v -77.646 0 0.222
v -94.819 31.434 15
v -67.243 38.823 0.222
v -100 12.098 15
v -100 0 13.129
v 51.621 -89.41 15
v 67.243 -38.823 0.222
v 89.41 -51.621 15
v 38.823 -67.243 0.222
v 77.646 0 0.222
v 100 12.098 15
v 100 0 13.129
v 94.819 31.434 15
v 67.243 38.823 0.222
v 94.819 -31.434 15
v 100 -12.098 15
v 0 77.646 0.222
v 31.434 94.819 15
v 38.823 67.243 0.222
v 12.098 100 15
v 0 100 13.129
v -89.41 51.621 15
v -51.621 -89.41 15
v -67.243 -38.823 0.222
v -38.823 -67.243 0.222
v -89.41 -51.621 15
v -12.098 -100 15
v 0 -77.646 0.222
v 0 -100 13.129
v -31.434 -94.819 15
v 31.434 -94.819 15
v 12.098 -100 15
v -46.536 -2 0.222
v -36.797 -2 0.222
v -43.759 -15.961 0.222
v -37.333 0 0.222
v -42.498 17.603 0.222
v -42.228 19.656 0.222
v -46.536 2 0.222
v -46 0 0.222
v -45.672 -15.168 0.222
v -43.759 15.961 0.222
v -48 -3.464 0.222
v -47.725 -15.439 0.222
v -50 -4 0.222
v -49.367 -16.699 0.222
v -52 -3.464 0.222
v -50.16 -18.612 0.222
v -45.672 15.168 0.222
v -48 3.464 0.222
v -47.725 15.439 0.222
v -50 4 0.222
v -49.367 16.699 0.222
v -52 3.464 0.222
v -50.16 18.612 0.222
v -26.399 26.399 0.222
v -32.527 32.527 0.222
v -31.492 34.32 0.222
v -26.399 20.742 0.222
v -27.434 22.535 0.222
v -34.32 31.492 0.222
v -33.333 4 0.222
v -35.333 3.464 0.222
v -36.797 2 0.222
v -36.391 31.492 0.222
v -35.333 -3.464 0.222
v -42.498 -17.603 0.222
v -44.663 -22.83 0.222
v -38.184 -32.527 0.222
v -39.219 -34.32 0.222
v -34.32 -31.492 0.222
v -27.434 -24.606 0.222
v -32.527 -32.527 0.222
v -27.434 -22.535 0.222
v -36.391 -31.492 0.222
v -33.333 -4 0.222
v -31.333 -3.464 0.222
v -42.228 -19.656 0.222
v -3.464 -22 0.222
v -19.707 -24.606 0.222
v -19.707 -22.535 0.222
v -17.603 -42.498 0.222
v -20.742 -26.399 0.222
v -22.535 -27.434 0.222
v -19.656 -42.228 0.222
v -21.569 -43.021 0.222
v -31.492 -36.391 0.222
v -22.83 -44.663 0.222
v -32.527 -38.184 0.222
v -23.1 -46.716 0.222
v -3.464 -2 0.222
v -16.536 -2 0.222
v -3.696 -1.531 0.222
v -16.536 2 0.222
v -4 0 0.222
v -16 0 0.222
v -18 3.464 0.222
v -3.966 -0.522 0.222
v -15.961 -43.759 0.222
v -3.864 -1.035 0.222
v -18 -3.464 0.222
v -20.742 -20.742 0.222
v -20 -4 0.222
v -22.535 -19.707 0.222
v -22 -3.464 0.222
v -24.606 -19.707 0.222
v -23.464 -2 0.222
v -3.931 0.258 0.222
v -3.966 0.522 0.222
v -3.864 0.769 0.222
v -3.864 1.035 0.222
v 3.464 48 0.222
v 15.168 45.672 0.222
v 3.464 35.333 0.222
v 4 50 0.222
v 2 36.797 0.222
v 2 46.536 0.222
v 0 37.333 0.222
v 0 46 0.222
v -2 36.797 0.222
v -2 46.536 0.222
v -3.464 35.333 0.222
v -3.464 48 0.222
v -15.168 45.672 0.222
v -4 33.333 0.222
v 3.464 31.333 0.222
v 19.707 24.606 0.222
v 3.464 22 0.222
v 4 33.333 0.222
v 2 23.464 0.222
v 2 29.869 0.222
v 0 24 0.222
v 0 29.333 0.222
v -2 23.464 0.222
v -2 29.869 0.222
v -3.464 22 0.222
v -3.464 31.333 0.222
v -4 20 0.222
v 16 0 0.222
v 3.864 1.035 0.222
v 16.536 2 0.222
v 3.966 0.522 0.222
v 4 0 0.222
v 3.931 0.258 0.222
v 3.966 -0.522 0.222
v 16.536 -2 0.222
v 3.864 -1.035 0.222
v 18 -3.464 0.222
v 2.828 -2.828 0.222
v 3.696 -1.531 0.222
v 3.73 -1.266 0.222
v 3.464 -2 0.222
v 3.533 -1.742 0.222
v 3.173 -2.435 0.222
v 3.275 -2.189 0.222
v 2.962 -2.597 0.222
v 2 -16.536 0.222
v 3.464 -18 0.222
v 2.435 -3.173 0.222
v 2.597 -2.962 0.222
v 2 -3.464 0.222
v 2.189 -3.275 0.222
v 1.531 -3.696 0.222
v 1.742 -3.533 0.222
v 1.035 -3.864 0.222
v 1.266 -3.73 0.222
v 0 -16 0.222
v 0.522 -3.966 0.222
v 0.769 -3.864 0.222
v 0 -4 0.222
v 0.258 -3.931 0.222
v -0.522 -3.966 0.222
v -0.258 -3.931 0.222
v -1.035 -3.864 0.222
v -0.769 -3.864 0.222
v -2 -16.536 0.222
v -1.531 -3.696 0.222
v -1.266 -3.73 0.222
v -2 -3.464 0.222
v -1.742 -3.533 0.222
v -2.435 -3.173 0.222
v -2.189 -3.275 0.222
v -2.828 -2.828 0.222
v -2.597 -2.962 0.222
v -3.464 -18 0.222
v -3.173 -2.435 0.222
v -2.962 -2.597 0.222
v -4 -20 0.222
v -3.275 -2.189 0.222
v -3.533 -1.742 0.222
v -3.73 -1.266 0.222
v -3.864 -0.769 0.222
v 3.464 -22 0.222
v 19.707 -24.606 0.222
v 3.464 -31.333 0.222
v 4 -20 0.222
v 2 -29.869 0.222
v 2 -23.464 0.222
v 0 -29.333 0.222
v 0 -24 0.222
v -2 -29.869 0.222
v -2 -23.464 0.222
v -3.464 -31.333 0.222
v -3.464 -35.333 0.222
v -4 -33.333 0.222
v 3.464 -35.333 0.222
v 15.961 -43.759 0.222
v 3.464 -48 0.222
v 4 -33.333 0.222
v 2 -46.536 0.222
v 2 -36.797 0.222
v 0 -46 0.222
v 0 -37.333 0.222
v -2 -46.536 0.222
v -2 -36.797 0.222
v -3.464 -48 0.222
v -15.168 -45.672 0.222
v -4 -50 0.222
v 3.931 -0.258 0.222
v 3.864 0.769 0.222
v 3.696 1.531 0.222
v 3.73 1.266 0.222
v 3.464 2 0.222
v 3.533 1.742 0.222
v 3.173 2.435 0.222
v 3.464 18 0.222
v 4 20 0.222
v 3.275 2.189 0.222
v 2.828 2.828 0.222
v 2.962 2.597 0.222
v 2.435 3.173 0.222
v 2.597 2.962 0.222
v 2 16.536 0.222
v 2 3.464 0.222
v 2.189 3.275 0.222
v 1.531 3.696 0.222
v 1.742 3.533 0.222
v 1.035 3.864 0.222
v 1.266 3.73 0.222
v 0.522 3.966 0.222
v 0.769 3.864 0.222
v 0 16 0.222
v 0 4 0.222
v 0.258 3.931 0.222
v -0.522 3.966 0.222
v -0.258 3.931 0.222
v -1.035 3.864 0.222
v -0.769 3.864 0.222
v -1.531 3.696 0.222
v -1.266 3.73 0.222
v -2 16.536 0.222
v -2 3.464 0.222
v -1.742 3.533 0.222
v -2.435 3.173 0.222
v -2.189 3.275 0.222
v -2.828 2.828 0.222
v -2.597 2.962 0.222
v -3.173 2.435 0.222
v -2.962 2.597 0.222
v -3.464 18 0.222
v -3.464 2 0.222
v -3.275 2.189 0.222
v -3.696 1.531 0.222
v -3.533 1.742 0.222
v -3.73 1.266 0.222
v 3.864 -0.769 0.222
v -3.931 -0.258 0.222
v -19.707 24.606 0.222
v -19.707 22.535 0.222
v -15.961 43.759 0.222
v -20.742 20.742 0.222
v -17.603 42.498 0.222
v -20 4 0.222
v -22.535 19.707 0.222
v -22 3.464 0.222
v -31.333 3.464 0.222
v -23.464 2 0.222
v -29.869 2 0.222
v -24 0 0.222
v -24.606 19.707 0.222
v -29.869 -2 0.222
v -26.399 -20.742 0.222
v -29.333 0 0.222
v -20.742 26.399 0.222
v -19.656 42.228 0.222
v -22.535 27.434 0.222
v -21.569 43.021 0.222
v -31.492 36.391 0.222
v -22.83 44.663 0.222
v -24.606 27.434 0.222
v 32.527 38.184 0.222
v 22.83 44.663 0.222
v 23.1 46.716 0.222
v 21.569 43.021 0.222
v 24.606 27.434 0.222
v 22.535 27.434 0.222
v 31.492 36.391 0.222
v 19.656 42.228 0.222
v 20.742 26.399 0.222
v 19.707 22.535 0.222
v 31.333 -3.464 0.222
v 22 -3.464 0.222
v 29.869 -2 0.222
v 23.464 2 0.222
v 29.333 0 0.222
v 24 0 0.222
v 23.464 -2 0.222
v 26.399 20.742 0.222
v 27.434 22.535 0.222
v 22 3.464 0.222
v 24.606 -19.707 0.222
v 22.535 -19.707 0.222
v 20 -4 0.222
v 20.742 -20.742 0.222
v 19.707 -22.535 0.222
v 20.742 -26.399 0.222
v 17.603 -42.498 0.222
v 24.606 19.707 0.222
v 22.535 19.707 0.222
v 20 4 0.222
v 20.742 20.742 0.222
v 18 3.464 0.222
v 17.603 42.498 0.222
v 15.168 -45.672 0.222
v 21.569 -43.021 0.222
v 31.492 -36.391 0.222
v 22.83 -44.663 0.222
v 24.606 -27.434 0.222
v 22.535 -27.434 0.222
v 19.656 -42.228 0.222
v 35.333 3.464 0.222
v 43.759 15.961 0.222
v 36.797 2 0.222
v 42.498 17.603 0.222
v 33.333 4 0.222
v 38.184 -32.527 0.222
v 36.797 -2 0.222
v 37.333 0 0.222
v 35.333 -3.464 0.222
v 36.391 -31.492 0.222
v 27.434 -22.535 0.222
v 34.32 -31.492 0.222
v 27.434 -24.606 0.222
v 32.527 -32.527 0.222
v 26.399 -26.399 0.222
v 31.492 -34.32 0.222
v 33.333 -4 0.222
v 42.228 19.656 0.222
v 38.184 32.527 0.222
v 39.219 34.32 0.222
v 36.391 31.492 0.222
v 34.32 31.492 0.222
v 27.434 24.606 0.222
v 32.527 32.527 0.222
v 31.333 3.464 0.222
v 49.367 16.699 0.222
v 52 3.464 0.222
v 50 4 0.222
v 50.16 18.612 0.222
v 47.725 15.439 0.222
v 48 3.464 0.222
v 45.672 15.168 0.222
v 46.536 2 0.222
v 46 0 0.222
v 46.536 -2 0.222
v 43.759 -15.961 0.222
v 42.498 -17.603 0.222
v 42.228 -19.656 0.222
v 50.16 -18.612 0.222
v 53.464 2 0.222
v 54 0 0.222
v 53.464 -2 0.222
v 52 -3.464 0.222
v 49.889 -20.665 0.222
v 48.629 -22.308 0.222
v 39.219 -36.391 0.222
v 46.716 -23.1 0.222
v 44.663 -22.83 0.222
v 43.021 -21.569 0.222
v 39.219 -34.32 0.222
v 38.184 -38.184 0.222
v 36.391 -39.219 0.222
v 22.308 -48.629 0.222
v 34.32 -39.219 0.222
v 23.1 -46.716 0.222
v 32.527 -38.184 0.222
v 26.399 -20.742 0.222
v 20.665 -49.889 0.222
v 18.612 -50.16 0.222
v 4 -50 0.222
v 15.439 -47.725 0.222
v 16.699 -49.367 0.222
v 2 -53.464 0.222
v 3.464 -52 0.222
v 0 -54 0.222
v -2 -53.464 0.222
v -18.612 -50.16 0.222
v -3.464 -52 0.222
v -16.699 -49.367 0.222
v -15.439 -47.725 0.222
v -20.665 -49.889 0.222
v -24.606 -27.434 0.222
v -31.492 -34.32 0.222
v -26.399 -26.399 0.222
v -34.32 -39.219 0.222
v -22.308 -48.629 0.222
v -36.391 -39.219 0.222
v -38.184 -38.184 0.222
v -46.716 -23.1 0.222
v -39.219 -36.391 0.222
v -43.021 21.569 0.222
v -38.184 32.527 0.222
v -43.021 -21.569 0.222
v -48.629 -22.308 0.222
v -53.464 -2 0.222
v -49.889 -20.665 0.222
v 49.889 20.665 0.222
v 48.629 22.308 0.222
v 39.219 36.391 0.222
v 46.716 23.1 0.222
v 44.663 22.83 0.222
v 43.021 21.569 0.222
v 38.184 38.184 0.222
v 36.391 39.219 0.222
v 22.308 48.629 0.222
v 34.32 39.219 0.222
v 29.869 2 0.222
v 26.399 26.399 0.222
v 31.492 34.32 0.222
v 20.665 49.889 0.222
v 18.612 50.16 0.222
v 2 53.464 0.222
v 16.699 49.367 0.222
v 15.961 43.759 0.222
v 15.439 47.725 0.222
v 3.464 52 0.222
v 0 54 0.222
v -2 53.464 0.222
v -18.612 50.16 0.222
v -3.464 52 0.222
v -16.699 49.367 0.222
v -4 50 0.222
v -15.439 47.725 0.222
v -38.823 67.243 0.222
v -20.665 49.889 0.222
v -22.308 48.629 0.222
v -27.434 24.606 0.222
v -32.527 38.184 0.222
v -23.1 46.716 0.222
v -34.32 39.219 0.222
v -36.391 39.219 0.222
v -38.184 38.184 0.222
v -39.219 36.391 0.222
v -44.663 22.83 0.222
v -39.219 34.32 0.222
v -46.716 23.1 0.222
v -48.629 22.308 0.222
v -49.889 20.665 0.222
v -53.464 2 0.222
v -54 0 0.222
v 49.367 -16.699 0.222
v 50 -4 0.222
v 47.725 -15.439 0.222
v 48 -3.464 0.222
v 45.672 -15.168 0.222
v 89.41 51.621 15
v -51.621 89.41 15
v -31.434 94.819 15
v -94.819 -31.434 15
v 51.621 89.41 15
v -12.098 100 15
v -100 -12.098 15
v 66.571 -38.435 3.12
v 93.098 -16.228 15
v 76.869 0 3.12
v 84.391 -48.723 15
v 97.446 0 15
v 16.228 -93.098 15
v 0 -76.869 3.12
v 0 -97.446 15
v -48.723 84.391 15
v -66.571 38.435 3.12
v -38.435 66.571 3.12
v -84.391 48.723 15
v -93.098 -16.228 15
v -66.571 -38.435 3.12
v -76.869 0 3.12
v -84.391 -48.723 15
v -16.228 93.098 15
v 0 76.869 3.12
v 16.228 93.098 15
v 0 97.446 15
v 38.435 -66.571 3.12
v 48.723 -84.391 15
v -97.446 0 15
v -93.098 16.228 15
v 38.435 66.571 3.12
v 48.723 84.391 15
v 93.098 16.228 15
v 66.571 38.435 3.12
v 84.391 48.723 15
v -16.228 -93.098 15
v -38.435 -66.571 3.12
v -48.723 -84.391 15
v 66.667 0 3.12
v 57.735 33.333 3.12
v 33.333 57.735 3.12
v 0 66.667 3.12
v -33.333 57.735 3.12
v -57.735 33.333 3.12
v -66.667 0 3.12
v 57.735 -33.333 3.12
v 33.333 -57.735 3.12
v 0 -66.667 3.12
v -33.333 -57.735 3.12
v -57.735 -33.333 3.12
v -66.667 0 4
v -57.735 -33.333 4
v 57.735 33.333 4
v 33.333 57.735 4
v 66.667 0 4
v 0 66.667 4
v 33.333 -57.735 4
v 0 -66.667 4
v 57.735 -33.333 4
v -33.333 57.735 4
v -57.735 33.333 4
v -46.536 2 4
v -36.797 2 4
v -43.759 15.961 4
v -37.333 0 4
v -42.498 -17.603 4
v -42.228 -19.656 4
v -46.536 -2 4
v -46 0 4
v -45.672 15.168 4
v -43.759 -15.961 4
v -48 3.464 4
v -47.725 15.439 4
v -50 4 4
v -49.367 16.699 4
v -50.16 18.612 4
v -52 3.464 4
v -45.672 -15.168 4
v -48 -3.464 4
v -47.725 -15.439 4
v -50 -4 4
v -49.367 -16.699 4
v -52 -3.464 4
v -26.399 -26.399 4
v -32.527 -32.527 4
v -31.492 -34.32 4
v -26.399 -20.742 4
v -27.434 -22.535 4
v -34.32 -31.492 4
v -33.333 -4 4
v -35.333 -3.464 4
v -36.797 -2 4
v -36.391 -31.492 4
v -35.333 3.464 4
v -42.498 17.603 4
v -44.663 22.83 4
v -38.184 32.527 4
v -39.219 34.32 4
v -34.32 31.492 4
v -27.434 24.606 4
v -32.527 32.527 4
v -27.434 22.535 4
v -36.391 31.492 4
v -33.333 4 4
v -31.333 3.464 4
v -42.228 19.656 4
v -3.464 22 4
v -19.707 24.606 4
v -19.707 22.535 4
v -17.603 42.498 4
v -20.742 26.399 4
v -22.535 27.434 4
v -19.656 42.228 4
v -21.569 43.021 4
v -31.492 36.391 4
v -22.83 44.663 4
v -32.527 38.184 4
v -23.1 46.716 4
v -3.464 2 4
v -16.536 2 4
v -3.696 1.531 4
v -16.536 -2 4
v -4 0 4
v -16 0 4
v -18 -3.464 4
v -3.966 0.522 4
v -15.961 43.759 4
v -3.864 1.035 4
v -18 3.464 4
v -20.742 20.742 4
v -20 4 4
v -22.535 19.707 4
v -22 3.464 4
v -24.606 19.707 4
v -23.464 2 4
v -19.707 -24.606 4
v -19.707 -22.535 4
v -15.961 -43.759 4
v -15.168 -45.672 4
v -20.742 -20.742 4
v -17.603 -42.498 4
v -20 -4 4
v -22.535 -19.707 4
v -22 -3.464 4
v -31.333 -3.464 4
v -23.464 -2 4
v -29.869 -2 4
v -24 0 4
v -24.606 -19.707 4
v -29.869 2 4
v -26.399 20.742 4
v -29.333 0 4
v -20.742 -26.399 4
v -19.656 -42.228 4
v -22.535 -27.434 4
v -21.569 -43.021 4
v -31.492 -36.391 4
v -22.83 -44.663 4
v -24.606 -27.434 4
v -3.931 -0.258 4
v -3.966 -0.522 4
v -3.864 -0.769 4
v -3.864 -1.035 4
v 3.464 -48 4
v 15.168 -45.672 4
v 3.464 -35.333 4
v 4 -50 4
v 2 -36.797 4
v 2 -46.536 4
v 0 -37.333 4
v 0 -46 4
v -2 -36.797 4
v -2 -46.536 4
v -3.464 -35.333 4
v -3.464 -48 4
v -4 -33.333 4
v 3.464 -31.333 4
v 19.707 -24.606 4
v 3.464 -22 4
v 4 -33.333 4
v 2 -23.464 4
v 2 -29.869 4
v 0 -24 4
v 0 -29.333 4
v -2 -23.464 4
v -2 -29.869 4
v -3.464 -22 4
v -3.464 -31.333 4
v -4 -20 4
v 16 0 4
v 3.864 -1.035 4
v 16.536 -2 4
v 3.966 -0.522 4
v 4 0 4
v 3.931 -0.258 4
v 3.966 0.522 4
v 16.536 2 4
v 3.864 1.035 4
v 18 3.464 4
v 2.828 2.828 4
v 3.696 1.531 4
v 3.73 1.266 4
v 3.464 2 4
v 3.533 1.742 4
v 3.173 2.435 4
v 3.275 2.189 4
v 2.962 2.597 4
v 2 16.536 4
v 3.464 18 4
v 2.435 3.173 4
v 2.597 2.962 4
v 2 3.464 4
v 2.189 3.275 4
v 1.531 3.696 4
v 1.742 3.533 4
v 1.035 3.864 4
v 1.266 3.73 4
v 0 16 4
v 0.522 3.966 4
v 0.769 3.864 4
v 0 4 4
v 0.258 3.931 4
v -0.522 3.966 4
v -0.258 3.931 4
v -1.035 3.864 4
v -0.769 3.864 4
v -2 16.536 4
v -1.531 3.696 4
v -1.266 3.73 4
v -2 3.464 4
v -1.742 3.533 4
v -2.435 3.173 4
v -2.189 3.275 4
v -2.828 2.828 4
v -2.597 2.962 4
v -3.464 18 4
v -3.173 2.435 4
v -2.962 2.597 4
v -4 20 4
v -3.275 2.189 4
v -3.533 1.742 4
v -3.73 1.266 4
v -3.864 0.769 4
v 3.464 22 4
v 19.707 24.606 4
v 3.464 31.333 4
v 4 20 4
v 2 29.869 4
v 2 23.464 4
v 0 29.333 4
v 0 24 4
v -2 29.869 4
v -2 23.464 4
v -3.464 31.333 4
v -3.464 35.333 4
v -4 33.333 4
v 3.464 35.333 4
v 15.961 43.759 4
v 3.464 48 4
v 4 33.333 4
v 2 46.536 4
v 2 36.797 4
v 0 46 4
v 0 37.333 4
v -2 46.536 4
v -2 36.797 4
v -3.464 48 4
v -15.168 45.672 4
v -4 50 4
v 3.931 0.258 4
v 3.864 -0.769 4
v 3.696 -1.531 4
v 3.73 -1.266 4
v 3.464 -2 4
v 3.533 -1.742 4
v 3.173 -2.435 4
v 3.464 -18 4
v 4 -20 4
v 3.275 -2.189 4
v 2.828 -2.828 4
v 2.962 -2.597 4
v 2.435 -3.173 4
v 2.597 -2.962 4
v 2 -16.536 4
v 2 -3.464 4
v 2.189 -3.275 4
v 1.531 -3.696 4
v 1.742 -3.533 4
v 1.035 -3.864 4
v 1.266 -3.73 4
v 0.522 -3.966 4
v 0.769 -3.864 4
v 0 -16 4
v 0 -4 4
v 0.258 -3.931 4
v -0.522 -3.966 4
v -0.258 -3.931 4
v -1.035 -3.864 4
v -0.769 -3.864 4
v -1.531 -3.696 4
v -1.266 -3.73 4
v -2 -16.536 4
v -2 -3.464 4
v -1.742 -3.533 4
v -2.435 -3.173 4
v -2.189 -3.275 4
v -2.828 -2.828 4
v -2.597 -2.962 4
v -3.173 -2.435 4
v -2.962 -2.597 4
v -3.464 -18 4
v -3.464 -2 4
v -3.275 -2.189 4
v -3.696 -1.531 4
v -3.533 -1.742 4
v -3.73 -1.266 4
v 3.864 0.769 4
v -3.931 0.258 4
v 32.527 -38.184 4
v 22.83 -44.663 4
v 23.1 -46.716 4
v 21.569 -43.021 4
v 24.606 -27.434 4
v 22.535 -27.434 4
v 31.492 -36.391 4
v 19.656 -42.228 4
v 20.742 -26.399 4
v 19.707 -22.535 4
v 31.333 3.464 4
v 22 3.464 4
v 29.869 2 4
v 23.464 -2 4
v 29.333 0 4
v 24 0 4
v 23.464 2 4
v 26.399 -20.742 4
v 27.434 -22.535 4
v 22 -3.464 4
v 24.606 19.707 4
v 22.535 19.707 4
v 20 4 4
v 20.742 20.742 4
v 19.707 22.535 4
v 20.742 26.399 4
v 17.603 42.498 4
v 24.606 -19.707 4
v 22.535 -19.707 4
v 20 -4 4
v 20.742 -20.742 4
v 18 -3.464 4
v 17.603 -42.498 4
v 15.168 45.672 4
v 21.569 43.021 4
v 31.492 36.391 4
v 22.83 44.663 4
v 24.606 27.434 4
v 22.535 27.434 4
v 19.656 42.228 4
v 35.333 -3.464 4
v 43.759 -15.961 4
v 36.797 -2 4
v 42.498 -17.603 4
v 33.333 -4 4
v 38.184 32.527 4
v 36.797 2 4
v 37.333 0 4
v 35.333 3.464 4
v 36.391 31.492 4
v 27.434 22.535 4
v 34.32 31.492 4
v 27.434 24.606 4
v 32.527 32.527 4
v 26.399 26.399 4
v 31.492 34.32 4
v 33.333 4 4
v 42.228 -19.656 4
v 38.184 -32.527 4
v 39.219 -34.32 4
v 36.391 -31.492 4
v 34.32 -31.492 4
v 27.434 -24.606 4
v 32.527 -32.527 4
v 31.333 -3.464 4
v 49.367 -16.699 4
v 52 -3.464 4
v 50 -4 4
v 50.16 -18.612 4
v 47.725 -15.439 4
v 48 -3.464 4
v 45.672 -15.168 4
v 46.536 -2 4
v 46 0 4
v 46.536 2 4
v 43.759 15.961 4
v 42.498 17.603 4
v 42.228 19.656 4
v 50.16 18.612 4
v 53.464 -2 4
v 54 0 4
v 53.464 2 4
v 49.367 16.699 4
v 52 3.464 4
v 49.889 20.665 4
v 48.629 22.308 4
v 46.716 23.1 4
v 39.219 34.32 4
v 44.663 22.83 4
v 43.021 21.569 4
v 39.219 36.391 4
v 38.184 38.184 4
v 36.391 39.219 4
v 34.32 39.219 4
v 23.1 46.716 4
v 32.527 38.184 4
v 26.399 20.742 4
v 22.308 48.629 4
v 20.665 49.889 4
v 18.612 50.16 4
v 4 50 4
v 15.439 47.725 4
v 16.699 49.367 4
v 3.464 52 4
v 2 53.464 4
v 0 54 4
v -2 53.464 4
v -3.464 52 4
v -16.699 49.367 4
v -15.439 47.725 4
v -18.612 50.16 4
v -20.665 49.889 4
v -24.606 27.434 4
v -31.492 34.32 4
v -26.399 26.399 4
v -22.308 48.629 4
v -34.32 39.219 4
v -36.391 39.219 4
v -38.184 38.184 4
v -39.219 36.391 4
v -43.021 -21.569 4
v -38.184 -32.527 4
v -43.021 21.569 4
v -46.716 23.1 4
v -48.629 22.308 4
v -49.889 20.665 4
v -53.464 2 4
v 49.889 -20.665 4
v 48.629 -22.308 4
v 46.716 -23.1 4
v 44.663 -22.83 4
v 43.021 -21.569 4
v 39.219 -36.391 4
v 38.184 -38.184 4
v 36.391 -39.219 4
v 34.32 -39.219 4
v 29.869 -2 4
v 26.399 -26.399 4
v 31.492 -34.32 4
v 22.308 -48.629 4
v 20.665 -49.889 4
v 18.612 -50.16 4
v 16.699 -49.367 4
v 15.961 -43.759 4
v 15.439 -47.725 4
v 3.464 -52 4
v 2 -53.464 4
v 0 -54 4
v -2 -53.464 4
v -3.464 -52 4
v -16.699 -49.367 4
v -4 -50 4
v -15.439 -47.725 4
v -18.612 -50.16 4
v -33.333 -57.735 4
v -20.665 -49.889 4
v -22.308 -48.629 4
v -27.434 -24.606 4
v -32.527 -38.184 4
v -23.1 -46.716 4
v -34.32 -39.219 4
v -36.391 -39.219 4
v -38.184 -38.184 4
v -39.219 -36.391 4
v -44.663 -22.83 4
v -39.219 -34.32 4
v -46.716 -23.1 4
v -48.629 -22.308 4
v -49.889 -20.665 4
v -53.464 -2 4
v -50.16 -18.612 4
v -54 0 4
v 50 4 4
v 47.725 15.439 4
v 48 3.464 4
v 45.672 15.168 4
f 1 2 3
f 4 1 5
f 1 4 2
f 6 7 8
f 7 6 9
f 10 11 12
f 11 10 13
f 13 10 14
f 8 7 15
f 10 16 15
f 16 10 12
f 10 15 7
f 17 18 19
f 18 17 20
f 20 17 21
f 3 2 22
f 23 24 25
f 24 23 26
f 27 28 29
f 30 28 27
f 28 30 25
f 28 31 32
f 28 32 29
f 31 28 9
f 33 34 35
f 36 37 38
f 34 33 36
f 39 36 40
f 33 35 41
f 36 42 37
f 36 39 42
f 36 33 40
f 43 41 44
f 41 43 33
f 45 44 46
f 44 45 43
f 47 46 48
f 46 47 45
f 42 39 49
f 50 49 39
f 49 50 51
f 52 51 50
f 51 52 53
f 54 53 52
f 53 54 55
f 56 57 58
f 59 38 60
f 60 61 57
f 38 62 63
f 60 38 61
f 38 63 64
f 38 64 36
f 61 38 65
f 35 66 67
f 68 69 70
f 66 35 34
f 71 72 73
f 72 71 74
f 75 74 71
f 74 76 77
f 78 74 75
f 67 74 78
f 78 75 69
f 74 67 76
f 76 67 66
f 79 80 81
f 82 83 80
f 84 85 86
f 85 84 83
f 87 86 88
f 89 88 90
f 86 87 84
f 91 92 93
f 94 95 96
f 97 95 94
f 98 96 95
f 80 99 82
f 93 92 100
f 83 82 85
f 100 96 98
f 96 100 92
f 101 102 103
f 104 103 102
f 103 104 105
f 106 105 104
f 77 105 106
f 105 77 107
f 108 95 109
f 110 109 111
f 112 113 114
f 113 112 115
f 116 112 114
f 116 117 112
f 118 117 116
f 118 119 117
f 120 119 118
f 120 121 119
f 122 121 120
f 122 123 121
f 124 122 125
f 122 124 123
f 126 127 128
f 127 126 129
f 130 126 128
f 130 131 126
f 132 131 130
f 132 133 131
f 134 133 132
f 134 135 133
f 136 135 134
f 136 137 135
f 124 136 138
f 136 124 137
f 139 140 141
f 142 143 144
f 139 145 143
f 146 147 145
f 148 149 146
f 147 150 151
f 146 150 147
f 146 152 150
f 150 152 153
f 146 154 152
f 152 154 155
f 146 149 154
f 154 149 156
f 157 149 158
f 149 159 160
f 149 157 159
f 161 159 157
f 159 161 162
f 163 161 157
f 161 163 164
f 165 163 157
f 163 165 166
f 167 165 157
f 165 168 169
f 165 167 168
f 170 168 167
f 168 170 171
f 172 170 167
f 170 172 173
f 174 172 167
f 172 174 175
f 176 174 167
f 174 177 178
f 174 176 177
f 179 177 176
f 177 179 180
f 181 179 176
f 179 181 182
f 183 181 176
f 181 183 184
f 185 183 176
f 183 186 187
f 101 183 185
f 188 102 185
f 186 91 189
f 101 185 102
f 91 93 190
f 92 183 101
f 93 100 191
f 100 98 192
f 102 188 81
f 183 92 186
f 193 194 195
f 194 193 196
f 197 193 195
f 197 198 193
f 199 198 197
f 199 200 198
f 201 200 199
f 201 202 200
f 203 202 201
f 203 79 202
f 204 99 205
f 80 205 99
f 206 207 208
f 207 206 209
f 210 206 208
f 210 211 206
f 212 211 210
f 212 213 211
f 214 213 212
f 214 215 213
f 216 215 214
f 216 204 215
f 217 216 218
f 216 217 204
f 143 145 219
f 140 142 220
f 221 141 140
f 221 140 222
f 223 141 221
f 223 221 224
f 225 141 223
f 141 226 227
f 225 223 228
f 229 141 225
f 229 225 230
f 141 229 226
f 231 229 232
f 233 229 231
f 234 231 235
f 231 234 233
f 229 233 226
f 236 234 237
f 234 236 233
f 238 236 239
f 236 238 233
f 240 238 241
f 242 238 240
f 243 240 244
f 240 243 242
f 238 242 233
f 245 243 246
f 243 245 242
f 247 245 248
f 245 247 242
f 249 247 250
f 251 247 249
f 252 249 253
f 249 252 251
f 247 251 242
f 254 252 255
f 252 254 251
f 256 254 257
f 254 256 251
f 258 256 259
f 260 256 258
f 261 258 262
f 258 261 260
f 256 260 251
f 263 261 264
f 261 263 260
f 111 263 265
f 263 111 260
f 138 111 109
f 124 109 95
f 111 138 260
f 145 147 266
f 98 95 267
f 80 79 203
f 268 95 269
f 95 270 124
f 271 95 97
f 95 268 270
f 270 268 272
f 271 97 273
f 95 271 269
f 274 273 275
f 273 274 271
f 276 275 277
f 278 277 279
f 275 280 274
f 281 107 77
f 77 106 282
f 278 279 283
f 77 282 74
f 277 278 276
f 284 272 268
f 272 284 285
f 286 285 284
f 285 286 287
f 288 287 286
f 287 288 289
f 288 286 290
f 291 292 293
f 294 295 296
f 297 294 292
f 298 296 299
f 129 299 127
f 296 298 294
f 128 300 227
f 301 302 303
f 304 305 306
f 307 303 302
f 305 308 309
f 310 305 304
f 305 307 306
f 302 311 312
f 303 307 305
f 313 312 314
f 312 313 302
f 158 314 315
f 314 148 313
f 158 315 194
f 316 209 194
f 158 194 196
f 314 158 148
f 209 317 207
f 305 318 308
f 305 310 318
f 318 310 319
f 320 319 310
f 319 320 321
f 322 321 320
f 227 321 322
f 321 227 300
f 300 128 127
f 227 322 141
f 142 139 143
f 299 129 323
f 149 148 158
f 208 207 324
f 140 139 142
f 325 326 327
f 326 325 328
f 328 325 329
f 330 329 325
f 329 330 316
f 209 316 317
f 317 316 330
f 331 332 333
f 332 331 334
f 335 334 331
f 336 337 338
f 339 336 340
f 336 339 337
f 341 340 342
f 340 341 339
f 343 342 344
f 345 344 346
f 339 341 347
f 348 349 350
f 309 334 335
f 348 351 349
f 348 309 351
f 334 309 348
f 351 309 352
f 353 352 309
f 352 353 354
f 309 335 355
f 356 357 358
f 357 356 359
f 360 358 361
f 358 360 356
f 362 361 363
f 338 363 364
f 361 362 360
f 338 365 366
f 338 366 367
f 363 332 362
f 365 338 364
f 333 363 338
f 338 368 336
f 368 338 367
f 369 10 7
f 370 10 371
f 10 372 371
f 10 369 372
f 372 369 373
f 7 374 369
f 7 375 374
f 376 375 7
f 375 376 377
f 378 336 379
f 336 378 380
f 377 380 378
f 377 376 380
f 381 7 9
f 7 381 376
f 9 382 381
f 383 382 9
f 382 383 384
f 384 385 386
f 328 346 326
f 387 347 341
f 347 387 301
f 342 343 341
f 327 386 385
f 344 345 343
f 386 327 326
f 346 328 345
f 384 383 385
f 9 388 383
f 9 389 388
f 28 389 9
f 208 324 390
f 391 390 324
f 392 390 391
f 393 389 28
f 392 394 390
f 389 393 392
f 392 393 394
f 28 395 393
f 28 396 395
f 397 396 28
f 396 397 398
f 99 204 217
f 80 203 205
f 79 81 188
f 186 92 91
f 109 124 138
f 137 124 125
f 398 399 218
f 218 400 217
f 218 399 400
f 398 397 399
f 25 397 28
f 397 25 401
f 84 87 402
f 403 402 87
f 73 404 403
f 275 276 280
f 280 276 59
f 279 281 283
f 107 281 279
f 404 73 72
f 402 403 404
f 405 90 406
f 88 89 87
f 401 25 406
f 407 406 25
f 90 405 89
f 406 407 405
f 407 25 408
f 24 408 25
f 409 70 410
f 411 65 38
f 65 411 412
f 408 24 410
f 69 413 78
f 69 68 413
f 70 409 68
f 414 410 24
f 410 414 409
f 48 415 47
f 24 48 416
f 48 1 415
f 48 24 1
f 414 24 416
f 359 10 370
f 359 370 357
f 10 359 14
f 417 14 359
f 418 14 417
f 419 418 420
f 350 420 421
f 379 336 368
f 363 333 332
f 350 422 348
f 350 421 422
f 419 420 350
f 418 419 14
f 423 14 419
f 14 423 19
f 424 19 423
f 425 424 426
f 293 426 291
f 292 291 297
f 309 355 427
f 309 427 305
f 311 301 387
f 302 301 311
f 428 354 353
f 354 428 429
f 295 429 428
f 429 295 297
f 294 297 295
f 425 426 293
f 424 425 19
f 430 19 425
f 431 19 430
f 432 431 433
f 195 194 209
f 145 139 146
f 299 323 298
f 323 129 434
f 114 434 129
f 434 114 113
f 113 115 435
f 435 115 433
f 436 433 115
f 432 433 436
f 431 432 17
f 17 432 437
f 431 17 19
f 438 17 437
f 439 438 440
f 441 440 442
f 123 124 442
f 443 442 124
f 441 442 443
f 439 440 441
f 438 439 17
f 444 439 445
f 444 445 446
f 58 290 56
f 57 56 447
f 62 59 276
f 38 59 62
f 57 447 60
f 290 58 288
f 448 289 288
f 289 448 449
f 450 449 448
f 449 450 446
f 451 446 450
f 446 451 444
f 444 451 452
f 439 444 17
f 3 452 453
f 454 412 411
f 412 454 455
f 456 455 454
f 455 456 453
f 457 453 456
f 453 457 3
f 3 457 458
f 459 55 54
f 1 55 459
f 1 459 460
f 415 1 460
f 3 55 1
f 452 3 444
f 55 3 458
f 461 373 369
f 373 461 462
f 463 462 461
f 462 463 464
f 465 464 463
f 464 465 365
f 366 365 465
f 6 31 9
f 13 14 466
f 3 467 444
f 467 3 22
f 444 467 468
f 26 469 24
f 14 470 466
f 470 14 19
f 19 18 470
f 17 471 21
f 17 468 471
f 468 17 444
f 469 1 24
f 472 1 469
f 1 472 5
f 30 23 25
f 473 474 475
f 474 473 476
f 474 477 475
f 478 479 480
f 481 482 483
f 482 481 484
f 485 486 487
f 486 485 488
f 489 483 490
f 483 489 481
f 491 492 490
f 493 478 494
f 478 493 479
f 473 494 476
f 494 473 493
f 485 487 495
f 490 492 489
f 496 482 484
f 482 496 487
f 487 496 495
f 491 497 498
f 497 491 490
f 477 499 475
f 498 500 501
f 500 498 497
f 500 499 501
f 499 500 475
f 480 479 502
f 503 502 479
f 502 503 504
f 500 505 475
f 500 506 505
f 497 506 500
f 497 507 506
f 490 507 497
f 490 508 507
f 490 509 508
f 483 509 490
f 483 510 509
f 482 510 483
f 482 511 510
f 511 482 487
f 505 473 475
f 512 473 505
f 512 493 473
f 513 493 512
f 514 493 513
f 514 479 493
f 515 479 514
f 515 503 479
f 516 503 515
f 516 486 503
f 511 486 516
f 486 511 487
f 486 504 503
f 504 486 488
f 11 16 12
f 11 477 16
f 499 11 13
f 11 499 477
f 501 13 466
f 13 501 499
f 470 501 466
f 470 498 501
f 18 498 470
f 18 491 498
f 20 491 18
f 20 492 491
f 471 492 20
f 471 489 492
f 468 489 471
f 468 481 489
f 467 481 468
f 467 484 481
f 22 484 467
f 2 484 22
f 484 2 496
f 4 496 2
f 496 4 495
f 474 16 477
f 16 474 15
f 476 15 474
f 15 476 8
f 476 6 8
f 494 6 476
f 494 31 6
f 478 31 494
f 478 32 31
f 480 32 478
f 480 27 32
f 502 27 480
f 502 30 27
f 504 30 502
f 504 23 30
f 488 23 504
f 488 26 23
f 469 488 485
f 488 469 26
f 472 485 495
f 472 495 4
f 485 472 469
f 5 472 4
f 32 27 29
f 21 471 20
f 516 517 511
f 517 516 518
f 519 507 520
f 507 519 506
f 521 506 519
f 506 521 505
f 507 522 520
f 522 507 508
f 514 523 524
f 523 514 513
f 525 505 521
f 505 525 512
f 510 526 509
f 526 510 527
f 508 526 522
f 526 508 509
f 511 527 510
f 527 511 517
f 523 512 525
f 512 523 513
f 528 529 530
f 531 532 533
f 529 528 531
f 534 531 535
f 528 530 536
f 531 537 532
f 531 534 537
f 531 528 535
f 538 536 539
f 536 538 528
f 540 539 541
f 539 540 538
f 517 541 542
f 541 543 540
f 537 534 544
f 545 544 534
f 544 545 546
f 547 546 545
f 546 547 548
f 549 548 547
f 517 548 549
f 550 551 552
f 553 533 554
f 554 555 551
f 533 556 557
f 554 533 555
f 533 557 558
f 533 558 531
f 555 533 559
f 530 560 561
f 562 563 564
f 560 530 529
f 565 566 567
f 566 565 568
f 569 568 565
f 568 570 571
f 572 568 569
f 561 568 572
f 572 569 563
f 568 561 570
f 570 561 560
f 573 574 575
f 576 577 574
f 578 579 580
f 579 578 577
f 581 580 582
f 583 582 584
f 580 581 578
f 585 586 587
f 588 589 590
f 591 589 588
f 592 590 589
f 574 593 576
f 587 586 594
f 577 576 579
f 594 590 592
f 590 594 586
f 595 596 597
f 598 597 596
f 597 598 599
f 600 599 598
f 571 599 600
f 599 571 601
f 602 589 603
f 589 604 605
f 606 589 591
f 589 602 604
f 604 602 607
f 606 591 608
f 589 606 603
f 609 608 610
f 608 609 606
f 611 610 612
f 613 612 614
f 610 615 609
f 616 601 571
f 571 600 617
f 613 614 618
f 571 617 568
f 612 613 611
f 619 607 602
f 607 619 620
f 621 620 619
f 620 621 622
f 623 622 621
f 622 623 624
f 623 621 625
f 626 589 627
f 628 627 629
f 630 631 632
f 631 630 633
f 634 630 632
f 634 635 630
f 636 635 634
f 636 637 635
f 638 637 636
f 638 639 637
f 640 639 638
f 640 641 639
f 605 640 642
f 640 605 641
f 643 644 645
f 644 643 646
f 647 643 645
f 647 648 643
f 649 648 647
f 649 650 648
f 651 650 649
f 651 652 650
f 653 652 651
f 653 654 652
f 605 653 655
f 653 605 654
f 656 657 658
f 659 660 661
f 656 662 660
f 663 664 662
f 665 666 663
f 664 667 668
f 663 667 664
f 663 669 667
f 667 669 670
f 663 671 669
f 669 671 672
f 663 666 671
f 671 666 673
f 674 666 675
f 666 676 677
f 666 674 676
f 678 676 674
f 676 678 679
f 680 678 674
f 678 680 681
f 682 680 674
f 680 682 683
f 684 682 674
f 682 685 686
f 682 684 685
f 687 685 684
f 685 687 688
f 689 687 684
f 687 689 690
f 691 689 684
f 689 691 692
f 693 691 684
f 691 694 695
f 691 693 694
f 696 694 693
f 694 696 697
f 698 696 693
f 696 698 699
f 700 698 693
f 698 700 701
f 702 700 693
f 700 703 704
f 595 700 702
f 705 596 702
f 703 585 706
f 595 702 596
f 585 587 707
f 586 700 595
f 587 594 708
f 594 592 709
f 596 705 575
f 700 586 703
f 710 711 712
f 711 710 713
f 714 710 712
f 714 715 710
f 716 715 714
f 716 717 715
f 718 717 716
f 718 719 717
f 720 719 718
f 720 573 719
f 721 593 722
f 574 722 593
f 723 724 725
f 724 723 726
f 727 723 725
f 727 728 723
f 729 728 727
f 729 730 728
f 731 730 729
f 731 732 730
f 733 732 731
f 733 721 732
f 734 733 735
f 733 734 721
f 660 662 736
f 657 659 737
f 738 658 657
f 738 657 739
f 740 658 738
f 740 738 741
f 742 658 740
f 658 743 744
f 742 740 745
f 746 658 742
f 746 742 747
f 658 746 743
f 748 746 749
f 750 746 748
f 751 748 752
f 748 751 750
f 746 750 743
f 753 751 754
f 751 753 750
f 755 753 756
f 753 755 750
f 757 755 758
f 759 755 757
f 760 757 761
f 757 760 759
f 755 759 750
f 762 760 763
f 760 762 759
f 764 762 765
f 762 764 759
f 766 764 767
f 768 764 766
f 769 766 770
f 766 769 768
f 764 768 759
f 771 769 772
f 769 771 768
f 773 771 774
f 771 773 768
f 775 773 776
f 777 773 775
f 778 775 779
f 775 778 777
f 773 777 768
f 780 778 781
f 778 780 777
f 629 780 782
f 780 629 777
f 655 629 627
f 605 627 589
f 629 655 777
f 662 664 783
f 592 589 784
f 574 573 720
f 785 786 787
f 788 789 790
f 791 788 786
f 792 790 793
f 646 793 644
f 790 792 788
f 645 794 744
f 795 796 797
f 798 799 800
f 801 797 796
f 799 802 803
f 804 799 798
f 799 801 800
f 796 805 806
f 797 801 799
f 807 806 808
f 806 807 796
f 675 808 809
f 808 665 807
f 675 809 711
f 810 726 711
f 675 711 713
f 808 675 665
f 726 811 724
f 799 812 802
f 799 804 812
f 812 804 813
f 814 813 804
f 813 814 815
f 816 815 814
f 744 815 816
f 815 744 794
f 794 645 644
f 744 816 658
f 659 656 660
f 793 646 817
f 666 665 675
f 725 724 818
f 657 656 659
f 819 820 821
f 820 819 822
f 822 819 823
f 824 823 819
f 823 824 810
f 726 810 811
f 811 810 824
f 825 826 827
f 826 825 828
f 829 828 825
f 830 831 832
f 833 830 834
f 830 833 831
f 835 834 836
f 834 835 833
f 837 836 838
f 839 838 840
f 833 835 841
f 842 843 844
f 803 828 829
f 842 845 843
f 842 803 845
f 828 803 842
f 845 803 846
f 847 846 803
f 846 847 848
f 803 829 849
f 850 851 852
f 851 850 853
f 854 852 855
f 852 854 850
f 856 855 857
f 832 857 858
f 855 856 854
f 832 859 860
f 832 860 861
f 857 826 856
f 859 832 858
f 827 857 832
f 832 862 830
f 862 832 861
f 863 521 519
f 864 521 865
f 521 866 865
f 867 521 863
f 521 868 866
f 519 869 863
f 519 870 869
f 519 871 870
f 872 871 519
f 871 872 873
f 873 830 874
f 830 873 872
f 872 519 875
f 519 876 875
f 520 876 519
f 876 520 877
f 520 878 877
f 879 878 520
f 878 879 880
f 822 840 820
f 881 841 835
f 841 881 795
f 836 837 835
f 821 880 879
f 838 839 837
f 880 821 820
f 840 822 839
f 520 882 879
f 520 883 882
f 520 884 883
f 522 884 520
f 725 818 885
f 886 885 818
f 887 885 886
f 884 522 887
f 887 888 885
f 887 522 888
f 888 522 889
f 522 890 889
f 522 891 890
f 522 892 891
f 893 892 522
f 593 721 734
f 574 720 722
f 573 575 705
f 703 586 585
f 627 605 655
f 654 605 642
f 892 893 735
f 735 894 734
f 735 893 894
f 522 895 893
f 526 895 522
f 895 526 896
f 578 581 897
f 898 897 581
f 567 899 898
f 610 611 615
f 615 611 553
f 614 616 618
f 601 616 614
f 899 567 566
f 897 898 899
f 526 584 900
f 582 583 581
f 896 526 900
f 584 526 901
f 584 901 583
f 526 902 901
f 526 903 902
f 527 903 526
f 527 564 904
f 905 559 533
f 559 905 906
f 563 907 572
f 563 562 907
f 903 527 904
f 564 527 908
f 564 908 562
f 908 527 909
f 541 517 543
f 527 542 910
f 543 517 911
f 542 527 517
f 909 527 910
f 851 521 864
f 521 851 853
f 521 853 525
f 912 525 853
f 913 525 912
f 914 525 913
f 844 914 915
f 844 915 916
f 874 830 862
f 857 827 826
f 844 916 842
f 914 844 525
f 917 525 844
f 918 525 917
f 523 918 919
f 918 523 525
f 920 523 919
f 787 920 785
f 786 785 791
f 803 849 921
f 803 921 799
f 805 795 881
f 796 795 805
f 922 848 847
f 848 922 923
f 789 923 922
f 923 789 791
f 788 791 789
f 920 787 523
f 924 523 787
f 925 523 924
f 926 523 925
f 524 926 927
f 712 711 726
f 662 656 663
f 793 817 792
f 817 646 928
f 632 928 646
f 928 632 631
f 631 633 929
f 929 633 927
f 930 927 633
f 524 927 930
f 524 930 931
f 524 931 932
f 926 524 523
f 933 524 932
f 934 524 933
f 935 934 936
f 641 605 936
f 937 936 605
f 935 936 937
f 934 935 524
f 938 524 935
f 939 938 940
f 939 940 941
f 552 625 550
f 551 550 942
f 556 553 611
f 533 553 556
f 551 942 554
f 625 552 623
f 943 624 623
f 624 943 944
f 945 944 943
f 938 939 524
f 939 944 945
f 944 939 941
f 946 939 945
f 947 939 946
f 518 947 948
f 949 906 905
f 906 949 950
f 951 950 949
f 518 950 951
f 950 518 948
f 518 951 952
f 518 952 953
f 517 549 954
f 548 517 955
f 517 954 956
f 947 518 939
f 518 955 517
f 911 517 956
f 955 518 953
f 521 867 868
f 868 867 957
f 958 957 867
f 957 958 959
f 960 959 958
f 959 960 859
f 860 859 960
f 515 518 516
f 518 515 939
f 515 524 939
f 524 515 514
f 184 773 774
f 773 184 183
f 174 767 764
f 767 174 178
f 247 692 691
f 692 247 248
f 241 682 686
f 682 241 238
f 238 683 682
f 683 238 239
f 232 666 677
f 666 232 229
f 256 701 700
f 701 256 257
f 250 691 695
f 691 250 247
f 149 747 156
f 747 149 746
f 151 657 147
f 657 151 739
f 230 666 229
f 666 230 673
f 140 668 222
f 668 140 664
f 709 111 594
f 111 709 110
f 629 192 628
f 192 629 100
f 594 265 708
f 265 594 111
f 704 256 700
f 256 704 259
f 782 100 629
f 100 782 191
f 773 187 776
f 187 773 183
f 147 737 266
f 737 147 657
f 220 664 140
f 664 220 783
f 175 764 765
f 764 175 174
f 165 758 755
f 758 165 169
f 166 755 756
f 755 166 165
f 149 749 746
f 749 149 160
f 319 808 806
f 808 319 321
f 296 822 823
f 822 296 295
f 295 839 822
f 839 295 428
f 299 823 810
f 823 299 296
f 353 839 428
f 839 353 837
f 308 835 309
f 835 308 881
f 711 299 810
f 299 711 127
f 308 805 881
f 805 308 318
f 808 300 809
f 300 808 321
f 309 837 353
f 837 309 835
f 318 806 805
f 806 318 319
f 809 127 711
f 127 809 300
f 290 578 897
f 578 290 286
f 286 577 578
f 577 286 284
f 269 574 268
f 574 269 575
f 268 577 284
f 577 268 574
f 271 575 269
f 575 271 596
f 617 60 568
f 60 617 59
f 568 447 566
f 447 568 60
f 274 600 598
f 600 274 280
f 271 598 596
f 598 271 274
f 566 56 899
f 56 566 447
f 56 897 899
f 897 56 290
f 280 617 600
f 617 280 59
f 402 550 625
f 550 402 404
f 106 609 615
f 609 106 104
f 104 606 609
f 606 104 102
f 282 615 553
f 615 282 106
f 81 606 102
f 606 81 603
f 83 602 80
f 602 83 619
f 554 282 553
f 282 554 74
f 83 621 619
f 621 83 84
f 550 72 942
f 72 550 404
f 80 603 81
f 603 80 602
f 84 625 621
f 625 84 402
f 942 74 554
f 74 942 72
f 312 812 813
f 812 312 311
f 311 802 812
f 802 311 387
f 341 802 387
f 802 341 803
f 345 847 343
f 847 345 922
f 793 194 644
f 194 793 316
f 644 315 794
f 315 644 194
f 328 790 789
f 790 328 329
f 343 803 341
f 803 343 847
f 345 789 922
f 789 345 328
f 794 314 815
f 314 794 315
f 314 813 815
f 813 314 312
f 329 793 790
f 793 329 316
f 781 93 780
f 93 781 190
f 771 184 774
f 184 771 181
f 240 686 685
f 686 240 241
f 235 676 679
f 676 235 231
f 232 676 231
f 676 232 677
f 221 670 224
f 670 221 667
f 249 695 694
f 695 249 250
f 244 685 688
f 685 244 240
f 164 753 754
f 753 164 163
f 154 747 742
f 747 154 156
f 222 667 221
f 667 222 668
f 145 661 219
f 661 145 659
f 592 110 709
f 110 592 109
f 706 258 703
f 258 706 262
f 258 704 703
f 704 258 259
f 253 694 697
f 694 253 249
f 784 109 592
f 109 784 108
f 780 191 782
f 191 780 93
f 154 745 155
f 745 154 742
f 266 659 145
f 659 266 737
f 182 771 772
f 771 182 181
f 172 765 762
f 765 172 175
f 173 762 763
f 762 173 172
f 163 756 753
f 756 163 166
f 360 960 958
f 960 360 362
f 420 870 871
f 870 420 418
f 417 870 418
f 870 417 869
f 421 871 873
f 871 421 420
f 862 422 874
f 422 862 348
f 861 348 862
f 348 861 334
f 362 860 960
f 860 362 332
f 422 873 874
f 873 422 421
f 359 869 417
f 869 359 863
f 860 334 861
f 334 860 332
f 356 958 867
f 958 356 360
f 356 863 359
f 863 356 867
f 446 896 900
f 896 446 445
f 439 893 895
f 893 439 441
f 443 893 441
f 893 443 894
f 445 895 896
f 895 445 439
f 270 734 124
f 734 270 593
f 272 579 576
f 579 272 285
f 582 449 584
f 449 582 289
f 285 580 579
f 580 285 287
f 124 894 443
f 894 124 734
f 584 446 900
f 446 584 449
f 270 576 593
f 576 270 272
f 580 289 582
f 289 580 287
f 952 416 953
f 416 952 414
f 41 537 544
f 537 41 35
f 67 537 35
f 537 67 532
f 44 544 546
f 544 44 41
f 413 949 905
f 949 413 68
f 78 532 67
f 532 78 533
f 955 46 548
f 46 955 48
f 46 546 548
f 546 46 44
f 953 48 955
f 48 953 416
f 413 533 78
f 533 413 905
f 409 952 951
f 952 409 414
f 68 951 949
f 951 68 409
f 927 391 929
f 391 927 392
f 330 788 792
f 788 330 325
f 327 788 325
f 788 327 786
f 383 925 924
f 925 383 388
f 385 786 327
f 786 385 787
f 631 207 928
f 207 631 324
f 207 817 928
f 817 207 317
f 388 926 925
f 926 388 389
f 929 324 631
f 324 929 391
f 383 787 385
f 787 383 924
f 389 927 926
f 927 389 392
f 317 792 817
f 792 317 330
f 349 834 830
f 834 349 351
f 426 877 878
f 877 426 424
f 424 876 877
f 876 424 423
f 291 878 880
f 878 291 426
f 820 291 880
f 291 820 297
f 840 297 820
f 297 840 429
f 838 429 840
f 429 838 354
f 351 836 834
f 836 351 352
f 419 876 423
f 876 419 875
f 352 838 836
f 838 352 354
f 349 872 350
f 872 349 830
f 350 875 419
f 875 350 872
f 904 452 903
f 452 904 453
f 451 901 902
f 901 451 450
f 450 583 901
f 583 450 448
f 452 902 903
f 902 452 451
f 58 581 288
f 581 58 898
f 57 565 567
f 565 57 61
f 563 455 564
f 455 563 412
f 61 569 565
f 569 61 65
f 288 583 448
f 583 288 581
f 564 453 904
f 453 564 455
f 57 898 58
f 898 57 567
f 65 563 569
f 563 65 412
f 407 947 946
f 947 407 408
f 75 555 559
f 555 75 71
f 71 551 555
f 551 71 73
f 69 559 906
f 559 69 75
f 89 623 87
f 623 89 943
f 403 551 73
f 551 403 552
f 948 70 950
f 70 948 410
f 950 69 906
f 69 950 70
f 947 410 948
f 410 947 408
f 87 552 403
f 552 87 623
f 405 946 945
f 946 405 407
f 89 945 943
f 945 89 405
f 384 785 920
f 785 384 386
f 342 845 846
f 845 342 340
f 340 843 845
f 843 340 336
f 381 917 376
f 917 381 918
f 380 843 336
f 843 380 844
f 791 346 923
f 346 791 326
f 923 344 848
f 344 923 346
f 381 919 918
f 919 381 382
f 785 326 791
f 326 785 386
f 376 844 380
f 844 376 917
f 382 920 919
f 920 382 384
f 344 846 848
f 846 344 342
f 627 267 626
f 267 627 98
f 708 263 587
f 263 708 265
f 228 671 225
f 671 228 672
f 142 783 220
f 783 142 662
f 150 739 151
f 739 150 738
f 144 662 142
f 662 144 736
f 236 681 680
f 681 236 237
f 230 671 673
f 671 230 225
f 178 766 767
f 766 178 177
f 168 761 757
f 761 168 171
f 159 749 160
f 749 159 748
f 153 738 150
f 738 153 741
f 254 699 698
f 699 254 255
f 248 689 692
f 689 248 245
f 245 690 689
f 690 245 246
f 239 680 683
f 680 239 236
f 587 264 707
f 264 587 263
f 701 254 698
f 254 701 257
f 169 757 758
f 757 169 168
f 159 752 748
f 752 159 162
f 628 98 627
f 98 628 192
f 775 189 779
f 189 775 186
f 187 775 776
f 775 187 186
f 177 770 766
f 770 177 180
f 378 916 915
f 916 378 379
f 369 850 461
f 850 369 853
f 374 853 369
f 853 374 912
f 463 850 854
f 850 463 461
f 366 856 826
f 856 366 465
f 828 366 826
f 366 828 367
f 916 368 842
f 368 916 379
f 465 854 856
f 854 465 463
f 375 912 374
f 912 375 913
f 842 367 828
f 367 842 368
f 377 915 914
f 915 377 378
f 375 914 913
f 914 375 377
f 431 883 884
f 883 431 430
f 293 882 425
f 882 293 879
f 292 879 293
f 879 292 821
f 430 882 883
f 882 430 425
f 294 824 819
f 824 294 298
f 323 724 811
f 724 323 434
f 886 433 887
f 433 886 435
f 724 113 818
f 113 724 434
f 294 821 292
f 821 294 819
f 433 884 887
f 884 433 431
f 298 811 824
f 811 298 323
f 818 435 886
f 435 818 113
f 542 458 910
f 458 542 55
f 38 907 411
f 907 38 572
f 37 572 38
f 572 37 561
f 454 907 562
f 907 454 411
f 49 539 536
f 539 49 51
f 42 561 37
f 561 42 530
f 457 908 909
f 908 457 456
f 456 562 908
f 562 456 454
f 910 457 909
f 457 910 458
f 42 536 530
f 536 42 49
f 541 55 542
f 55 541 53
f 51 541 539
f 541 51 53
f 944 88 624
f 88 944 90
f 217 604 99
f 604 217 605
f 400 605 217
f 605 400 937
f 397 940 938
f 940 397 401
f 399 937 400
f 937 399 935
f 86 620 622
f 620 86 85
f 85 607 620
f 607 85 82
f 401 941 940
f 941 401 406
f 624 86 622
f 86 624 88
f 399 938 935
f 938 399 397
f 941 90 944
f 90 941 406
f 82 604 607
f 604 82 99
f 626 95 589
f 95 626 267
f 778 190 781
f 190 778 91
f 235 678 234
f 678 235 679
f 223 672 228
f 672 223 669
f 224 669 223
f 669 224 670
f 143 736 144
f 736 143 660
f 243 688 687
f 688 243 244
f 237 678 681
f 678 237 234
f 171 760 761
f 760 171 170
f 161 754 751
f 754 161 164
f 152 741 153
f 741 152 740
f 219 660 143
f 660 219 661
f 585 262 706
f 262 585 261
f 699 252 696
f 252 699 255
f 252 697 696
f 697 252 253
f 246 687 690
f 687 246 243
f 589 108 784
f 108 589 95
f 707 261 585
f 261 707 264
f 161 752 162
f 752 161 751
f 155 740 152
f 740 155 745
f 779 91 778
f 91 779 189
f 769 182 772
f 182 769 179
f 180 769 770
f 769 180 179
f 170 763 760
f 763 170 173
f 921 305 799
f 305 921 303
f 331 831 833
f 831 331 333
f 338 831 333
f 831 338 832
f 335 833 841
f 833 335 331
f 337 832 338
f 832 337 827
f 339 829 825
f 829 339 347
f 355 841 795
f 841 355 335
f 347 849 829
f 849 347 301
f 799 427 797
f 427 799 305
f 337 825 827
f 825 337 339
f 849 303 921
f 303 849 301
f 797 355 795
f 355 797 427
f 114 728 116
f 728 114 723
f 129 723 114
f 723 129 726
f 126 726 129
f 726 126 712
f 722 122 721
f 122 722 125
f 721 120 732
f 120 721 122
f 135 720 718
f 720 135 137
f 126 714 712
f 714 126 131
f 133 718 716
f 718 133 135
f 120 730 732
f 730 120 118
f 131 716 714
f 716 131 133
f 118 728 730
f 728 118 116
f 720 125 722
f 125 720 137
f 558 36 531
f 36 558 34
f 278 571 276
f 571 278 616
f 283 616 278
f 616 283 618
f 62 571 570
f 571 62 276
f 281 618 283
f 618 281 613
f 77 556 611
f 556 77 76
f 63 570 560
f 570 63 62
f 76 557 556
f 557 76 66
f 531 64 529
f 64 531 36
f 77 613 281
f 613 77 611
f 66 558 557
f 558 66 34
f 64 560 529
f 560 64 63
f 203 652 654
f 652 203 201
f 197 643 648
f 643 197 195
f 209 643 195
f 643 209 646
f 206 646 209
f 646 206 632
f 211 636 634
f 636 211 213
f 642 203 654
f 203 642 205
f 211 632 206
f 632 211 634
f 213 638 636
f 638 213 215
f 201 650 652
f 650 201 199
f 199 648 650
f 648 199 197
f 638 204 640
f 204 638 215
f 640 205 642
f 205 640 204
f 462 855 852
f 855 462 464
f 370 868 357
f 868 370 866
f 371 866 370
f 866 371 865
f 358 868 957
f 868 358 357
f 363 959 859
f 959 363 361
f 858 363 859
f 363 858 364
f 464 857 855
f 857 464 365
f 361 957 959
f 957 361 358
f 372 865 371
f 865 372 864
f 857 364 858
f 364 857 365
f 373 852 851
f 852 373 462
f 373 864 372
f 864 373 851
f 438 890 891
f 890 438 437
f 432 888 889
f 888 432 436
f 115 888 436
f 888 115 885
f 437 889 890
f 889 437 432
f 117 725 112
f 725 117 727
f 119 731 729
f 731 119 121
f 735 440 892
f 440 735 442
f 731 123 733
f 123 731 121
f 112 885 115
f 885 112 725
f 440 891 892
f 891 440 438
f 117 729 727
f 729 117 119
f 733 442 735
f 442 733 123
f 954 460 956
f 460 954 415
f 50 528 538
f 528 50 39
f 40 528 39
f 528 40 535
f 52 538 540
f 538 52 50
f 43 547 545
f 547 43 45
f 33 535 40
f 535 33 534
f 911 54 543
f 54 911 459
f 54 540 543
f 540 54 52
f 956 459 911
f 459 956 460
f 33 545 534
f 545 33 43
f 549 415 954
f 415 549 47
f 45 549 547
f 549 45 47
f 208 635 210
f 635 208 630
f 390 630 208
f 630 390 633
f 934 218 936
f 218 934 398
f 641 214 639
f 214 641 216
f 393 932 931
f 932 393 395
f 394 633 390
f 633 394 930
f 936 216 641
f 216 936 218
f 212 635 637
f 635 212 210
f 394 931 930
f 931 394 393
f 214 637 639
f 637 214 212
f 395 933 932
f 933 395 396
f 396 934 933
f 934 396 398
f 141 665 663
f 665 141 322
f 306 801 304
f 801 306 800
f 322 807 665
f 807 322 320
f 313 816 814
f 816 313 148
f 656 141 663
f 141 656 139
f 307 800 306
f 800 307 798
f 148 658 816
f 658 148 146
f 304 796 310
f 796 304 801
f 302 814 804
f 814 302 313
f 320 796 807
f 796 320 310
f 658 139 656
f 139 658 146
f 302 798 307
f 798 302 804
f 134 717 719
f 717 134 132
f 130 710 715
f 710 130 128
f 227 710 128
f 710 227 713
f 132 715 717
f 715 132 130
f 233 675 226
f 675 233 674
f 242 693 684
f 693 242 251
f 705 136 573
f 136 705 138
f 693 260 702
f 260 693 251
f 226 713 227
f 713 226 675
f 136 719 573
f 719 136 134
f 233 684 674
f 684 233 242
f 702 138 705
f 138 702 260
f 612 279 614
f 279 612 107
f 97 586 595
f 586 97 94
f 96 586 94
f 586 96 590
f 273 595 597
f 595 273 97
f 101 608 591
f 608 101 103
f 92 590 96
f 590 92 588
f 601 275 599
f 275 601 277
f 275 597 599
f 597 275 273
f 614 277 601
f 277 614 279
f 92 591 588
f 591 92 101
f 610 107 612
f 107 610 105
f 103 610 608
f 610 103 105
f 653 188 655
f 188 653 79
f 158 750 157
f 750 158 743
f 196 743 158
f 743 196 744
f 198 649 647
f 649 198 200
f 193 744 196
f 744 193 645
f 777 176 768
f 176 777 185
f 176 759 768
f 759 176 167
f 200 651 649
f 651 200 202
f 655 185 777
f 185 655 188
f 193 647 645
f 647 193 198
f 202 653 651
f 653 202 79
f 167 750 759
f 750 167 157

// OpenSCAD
$fn = 12;

cot_cub = 200;





ray_sph = cot_cub/2*3;
ray_cyl = cot_cub/2;
ray_trou = cot_cub/50;
haut_trou = cot_cub/10;
ep_bor = 3;


translate([0,0,0])
union() {
    difference() {
        union() {
            translate([0,0,ray_sph-cot_cub/20])
            rotate([180,0,0])
            intersection() {
                difference () {
                    sphere(r = ray_sph);
                    sphere(r = ray_sph-ep_bor);
                    
                }
                translate([0,0,ray_sph])
                cube([cot_cub,cot_cub,ray_cyl/2],center = true);

            }



            translate([0,0,ep_bor/4+ep_bor/4+cot_cub/200])
            cylinder(r=ray_cyl/3*2,h=ep_bor,center = true);
        }
        cylinder(r=ray_trou,h=haut_trou,center = true);
        
        translate([ray_cyl/3,0,0])
        cylinder(r=ray_trou,h=haut_trou,center = true);
        
        translate([0,ray_cyl/3,0])
        cylinder(r=ray_trou,h=haut_trou,center = true);
        
        translate([-ray_cyl/3,0,0])
        cylinder(r=ray_trou,h=haut_trou,center = true);
        
        translate([0,-ray_cyl/3,0])
        cylinder(r=ray_trou,h=haut_trou,center = true);
        
        rotate([0,0,45]) {
            
        cylinder(r=ray_trou,h=haut_trou,center = true);
        
        translate([ray_cyl/3,0,0])
        cylinder(r=ray_trou,h=haut_trou,center = true);
        
        translate([0,ray_cyl/3,0])
        cylinder(r=ray_trou,h=haut_trou,center = true);
        
        translate([-ray_cyl/3,0,0])
        cylinder(r=ray_trou,h=haut_trou,center = true);
        
        translate([0,-ray_cyl/3,0])
        cylinder(r=ray_trou,h=haut_trou,center = true);            
        }
        
        
        
        translate([ray_cyl/2,0,0])
        cylinder(r=ray_trou,h=haut_trou,center = true);
        
        translate([0,ray_cyl/2,0])
        cylinder(r=ray_trou,h=haut_trou,center = true);
        
        translate([-ray_cyl/2,0,0])
        cylinder(r=ray_trou,h=haut_trou,center = true);
        
        translate([0,-ray_cyl/2,0])
        cylinder(r=ray_trou,h=haut_trou,center = true);
        
        rotate([0,0,22.5]) {
            
        cylinder(r=ray_trou,h=haut_trou,center = true);
        
        translate([ray_cyl/2,0,0])
        cylinder(r=ray_trou,h=haut_trou,center = true);
        
        translate([0,ray_cyl/2,0])
        cylinder(r=ray_trou,h=haut_trou,center = true);
        
        translate([-ray_cyl/2,0,0])
        cylinder(r=ray_trou,h=haut_trou,center = true);
        
        translate([0,-ray_cyl/2,0])
        cylinder(r=ray_trou,h=haut_trou,center = true);            
        }        

        rotate([0,0,45]) {
            
        cylinder(r=ray_trou,h=haut_trou,center = true);
        
        translate([ray_cyl/2,0,0])
        cylinder(r=ray_trou,h=haut_trou,center = true);
        
        translate([0,ray_cyl/2,0])
        cylinder(r=ray_trou,h=haut_trou,center = true);
        
        translate([-ray_cyl/2,0,0])
        cylinder(r=ray_trou,h=haut_trou,center = true);
        
        translate([0,-ray_cyl/2,0])
        cylinder(r=ray_trou,h=haut_trou,center = true);            
        }             

        rotate([0,0,-22.5]) {
            
        cylinder(r=ray_trou,h=haut_trou,center = true);
        
        translate([ray_cyl/2,0,0])
        cylinder(r=ray_trou,h=haut_trou,center = true);
        
        translate([0,ray_cyl/2,0])
        cylinder(r=ray_trou,h=haut_trou,center = true);
        
        translate([-ray_cyl/2,0,0])
        cylinder(r=ray_trou,h=haut_trou,center = true);
        
        translate([0,-ray_cyl/2,0])
        cylinder(r=ray_trou,h=haut_trou,center = true);            
        }        
        translate([ray_cyl/5,0,0])
        cylinder(r=ray_trou,h=haut_trou,center = true);
        
        translate([0,ray_cyl/5,0])
        cylinder(r=ray_trou,h=haut_trou,center = true);
        
        translate([-ray_cyl/5,0,0])
        cylinder(r=ray_trou,h=haut_trou,center = true);
        
        translate([0,-ray_cyl/5,0])
        cylinder(r=ray_trou,h=haut_trou,center = true);


}

}


































